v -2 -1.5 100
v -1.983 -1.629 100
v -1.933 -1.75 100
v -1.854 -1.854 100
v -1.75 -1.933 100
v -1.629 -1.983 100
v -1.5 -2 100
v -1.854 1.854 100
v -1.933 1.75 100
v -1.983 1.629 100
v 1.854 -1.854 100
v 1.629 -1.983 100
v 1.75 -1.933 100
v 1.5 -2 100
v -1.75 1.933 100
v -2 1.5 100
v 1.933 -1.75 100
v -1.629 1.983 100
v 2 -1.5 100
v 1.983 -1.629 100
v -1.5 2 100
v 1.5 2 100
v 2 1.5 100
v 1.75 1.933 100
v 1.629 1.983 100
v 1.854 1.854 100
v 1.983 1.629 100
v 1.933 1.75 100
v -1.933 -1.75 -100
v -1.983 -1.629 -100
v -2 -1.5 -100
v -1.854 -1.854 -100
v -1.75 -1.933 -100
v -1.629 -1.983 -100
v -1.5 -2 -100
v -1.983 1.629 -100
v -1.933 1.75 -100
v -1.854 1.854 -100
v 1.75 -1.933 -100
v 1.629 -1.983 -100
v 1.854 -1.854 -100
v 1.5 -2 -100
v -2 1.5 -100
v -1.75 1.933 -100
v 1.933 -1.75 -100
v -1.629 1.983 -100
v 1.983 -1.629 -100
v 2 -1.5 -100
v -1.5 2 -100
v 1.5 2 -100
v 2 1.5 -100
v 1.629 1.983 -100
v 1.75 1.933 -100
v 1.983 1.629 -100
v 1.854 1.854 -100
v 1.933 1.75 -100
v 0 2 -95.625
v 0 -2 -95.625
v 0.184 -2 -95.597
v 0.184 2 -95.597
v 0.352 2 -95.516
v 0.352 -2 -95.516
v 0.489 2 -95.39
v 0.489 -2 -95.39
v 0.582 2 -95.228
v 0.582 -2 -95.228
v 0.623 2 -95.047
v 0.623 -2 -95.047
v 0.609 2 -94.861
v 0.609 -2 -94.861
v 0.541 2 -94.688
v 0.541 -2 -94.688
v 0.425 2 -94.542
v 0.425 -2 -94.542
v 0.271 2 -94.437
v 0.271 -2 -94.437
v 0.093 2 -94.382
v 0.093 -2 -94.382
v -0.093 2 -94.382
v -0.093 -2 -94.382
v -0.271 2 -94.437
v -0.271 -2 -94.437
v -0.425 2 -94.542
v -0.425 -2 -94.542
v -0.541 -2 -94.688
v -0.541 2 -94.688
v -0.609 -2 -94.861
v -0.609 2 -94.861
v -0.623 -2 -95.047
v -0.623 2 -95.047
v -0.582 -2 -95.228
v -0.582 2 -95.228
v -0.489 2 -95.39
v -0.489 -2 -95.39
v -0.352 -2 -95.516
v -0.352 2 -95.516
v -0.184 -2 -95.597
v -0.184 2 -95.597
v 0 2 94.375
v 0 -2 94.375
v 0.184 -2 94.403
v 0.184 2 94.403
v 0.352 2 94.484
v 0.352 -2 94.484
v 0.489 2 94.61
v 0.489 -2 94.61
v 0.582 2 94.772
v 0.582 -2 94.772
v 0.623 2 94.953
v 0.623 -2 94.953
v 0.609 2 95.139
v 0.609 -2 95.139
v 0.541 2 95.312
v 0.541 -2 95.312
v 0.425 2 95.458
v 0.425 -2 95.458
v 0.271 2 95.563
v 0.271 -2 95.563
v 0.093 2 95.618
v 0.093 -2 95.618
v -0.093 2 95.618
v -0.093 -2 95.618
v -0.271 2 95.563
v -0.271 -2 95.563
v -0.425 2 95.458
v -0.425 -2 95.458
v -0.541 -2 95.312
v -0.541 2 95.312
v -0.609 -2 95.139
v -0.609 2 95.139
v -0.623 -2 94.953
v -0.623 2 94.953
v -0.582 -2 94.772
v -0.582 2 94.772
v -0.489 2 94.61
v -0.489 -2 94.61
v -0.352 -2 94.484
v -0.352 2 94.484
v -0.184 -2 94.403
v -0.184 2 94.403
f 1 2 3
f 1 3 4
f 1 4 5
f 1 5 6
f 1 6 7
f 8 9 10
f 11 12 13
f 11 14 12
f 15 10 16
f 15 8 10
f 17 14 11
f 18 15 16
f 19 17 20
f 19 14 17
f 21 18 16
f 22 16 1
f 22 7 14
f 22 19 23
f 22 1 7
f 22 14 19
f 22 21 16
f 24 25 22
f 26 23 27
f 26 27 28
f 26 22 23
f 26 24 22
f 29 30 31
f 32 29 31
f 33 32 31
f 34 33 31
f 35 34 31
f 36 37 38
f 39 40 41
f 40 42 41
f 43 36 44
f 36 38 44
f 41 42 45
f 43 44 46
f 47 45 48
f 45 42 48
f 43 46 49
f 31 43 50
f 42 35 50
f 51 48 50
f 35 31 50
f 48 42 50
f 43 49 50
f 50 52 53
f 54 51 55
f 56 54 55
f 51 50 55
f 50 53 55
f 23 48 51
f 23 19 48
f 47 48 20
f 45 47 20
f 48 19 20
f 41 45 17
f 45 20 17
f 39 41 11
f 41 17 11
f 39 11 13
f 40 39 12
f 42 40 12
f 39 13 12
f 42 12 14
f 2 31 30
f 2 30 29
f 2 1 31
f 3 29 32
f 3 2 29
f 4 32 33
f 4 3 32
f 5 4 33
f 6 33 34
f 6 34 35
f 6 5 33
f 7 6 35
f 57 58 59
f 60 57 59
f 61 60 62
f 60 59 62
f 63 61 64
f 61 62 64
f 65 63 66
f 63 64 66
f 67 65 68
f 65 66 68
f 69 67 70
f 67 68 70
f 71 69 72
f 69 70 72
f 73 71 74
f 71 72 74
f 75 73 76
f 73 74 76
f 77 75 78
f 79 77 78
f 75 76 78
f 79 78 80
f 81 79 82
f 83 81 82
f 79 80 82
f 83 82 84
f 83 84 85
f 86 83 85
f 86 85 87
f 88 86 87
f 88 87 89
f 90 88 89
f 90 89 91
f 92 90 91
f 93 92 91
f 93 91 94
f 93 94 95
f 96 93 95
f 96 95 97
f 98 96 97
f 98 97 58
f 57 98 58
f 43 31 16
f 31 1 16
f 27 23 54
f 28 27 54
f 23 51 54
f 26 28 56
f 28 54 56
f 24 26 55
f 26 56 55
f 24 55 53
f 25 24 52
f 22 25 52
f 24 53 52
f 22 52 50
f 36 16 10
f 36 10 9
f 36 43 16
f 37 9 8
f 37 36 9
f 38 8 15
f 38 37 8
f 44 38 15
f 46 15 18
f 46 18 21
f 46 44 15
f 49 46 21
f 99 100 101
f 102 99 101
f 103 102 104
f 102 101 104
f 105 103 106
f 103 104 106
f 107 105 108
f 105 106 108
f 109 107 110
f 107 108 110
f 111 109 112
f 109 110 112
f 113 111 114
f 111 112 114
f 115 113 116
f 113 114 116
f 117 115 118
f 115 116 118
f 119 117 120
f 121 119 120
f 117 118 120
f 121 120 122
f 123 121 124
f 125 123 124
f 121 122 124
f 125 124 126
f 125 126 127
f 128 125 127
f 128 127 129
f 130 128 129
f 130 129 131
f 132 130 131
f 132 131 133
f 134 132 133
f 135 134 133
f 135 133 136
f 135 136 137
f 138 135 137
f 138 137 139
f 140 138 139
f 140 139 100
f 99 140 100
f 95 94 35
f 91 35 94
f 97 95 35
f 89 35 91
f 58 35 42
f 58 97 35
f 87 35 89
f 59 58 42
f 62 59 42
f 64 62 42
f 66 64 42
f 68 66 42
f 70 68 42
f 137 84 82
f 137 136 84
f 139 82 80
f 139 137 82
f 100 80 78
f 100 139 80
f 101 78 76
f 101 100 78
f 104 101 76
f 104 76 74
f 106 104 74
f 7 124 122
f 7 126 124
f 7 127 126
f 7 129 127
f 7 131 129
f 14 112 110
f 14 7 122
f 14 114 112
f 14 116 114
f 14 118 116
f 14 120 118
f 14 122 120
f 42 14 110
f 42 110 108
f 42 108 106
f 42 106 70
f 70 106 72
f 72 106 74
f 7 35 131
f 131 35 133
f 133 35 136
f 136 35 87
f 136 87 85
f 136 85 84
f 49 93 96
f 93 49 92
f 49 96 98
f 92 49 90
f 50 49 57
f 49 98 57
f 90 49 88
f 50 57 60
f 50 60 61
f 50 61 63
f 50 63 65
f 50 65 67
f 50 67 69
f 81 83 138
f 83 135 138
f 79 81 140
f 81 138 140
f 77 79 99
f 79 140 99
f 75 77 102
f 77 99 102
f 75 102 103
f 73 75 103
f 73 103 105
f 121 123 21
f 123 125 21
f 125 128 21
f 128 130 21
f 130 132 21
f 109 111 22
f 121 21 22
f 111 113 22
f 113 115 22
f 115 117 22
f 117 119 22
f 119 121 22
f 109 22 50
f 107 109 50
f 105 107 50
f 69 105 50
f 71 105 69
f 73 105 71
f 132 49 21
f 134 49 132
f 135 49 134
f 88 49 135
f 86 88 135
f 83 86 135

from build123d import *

# Parameters (mm, degrees)
SKETCH1_W                 = 4
SKETCH1_H                 = 4
BOSS_EXTRUDE1_DEPTH       = 100
FILLET1_R                 = 0.5
TAP_DRILL_FOR_M1_6_TAP1_D = 1.25


with BuildPart() as part:
    # Sketch1 → Boss-Extrude1 (new, symmetric)
    with BuildSketch(Plane.XY):
        Rectangle(SKETCH1_W, SKETCH1_H)
    extrude(amount=BOSS_EXTRUDE1_DEPTH, both=True)

    # Fillet1
    fillet1_edges = [part.edges().sort_by_distance(p)[0] for p in [
        (2, -2, 0),
        (-2, -2, 0),
        (2, 2, 0),
        (-2, 2, 0),
    ]]
    fillet(fillet1_edges, radius=FILLET1_R)

    # Tap Drill for M1.6 Tap1 (through all)
    with Locations(Plane(origin=(0, 2, -95), x_dir=(0, 0, 1), z_dir=(0, 1, 0))):
        with Locations((0, 0), (190, 0)):
            Hole(TAP_DRILL_FOR_M1_6_TAP1_D / 2)


solid = part.part
